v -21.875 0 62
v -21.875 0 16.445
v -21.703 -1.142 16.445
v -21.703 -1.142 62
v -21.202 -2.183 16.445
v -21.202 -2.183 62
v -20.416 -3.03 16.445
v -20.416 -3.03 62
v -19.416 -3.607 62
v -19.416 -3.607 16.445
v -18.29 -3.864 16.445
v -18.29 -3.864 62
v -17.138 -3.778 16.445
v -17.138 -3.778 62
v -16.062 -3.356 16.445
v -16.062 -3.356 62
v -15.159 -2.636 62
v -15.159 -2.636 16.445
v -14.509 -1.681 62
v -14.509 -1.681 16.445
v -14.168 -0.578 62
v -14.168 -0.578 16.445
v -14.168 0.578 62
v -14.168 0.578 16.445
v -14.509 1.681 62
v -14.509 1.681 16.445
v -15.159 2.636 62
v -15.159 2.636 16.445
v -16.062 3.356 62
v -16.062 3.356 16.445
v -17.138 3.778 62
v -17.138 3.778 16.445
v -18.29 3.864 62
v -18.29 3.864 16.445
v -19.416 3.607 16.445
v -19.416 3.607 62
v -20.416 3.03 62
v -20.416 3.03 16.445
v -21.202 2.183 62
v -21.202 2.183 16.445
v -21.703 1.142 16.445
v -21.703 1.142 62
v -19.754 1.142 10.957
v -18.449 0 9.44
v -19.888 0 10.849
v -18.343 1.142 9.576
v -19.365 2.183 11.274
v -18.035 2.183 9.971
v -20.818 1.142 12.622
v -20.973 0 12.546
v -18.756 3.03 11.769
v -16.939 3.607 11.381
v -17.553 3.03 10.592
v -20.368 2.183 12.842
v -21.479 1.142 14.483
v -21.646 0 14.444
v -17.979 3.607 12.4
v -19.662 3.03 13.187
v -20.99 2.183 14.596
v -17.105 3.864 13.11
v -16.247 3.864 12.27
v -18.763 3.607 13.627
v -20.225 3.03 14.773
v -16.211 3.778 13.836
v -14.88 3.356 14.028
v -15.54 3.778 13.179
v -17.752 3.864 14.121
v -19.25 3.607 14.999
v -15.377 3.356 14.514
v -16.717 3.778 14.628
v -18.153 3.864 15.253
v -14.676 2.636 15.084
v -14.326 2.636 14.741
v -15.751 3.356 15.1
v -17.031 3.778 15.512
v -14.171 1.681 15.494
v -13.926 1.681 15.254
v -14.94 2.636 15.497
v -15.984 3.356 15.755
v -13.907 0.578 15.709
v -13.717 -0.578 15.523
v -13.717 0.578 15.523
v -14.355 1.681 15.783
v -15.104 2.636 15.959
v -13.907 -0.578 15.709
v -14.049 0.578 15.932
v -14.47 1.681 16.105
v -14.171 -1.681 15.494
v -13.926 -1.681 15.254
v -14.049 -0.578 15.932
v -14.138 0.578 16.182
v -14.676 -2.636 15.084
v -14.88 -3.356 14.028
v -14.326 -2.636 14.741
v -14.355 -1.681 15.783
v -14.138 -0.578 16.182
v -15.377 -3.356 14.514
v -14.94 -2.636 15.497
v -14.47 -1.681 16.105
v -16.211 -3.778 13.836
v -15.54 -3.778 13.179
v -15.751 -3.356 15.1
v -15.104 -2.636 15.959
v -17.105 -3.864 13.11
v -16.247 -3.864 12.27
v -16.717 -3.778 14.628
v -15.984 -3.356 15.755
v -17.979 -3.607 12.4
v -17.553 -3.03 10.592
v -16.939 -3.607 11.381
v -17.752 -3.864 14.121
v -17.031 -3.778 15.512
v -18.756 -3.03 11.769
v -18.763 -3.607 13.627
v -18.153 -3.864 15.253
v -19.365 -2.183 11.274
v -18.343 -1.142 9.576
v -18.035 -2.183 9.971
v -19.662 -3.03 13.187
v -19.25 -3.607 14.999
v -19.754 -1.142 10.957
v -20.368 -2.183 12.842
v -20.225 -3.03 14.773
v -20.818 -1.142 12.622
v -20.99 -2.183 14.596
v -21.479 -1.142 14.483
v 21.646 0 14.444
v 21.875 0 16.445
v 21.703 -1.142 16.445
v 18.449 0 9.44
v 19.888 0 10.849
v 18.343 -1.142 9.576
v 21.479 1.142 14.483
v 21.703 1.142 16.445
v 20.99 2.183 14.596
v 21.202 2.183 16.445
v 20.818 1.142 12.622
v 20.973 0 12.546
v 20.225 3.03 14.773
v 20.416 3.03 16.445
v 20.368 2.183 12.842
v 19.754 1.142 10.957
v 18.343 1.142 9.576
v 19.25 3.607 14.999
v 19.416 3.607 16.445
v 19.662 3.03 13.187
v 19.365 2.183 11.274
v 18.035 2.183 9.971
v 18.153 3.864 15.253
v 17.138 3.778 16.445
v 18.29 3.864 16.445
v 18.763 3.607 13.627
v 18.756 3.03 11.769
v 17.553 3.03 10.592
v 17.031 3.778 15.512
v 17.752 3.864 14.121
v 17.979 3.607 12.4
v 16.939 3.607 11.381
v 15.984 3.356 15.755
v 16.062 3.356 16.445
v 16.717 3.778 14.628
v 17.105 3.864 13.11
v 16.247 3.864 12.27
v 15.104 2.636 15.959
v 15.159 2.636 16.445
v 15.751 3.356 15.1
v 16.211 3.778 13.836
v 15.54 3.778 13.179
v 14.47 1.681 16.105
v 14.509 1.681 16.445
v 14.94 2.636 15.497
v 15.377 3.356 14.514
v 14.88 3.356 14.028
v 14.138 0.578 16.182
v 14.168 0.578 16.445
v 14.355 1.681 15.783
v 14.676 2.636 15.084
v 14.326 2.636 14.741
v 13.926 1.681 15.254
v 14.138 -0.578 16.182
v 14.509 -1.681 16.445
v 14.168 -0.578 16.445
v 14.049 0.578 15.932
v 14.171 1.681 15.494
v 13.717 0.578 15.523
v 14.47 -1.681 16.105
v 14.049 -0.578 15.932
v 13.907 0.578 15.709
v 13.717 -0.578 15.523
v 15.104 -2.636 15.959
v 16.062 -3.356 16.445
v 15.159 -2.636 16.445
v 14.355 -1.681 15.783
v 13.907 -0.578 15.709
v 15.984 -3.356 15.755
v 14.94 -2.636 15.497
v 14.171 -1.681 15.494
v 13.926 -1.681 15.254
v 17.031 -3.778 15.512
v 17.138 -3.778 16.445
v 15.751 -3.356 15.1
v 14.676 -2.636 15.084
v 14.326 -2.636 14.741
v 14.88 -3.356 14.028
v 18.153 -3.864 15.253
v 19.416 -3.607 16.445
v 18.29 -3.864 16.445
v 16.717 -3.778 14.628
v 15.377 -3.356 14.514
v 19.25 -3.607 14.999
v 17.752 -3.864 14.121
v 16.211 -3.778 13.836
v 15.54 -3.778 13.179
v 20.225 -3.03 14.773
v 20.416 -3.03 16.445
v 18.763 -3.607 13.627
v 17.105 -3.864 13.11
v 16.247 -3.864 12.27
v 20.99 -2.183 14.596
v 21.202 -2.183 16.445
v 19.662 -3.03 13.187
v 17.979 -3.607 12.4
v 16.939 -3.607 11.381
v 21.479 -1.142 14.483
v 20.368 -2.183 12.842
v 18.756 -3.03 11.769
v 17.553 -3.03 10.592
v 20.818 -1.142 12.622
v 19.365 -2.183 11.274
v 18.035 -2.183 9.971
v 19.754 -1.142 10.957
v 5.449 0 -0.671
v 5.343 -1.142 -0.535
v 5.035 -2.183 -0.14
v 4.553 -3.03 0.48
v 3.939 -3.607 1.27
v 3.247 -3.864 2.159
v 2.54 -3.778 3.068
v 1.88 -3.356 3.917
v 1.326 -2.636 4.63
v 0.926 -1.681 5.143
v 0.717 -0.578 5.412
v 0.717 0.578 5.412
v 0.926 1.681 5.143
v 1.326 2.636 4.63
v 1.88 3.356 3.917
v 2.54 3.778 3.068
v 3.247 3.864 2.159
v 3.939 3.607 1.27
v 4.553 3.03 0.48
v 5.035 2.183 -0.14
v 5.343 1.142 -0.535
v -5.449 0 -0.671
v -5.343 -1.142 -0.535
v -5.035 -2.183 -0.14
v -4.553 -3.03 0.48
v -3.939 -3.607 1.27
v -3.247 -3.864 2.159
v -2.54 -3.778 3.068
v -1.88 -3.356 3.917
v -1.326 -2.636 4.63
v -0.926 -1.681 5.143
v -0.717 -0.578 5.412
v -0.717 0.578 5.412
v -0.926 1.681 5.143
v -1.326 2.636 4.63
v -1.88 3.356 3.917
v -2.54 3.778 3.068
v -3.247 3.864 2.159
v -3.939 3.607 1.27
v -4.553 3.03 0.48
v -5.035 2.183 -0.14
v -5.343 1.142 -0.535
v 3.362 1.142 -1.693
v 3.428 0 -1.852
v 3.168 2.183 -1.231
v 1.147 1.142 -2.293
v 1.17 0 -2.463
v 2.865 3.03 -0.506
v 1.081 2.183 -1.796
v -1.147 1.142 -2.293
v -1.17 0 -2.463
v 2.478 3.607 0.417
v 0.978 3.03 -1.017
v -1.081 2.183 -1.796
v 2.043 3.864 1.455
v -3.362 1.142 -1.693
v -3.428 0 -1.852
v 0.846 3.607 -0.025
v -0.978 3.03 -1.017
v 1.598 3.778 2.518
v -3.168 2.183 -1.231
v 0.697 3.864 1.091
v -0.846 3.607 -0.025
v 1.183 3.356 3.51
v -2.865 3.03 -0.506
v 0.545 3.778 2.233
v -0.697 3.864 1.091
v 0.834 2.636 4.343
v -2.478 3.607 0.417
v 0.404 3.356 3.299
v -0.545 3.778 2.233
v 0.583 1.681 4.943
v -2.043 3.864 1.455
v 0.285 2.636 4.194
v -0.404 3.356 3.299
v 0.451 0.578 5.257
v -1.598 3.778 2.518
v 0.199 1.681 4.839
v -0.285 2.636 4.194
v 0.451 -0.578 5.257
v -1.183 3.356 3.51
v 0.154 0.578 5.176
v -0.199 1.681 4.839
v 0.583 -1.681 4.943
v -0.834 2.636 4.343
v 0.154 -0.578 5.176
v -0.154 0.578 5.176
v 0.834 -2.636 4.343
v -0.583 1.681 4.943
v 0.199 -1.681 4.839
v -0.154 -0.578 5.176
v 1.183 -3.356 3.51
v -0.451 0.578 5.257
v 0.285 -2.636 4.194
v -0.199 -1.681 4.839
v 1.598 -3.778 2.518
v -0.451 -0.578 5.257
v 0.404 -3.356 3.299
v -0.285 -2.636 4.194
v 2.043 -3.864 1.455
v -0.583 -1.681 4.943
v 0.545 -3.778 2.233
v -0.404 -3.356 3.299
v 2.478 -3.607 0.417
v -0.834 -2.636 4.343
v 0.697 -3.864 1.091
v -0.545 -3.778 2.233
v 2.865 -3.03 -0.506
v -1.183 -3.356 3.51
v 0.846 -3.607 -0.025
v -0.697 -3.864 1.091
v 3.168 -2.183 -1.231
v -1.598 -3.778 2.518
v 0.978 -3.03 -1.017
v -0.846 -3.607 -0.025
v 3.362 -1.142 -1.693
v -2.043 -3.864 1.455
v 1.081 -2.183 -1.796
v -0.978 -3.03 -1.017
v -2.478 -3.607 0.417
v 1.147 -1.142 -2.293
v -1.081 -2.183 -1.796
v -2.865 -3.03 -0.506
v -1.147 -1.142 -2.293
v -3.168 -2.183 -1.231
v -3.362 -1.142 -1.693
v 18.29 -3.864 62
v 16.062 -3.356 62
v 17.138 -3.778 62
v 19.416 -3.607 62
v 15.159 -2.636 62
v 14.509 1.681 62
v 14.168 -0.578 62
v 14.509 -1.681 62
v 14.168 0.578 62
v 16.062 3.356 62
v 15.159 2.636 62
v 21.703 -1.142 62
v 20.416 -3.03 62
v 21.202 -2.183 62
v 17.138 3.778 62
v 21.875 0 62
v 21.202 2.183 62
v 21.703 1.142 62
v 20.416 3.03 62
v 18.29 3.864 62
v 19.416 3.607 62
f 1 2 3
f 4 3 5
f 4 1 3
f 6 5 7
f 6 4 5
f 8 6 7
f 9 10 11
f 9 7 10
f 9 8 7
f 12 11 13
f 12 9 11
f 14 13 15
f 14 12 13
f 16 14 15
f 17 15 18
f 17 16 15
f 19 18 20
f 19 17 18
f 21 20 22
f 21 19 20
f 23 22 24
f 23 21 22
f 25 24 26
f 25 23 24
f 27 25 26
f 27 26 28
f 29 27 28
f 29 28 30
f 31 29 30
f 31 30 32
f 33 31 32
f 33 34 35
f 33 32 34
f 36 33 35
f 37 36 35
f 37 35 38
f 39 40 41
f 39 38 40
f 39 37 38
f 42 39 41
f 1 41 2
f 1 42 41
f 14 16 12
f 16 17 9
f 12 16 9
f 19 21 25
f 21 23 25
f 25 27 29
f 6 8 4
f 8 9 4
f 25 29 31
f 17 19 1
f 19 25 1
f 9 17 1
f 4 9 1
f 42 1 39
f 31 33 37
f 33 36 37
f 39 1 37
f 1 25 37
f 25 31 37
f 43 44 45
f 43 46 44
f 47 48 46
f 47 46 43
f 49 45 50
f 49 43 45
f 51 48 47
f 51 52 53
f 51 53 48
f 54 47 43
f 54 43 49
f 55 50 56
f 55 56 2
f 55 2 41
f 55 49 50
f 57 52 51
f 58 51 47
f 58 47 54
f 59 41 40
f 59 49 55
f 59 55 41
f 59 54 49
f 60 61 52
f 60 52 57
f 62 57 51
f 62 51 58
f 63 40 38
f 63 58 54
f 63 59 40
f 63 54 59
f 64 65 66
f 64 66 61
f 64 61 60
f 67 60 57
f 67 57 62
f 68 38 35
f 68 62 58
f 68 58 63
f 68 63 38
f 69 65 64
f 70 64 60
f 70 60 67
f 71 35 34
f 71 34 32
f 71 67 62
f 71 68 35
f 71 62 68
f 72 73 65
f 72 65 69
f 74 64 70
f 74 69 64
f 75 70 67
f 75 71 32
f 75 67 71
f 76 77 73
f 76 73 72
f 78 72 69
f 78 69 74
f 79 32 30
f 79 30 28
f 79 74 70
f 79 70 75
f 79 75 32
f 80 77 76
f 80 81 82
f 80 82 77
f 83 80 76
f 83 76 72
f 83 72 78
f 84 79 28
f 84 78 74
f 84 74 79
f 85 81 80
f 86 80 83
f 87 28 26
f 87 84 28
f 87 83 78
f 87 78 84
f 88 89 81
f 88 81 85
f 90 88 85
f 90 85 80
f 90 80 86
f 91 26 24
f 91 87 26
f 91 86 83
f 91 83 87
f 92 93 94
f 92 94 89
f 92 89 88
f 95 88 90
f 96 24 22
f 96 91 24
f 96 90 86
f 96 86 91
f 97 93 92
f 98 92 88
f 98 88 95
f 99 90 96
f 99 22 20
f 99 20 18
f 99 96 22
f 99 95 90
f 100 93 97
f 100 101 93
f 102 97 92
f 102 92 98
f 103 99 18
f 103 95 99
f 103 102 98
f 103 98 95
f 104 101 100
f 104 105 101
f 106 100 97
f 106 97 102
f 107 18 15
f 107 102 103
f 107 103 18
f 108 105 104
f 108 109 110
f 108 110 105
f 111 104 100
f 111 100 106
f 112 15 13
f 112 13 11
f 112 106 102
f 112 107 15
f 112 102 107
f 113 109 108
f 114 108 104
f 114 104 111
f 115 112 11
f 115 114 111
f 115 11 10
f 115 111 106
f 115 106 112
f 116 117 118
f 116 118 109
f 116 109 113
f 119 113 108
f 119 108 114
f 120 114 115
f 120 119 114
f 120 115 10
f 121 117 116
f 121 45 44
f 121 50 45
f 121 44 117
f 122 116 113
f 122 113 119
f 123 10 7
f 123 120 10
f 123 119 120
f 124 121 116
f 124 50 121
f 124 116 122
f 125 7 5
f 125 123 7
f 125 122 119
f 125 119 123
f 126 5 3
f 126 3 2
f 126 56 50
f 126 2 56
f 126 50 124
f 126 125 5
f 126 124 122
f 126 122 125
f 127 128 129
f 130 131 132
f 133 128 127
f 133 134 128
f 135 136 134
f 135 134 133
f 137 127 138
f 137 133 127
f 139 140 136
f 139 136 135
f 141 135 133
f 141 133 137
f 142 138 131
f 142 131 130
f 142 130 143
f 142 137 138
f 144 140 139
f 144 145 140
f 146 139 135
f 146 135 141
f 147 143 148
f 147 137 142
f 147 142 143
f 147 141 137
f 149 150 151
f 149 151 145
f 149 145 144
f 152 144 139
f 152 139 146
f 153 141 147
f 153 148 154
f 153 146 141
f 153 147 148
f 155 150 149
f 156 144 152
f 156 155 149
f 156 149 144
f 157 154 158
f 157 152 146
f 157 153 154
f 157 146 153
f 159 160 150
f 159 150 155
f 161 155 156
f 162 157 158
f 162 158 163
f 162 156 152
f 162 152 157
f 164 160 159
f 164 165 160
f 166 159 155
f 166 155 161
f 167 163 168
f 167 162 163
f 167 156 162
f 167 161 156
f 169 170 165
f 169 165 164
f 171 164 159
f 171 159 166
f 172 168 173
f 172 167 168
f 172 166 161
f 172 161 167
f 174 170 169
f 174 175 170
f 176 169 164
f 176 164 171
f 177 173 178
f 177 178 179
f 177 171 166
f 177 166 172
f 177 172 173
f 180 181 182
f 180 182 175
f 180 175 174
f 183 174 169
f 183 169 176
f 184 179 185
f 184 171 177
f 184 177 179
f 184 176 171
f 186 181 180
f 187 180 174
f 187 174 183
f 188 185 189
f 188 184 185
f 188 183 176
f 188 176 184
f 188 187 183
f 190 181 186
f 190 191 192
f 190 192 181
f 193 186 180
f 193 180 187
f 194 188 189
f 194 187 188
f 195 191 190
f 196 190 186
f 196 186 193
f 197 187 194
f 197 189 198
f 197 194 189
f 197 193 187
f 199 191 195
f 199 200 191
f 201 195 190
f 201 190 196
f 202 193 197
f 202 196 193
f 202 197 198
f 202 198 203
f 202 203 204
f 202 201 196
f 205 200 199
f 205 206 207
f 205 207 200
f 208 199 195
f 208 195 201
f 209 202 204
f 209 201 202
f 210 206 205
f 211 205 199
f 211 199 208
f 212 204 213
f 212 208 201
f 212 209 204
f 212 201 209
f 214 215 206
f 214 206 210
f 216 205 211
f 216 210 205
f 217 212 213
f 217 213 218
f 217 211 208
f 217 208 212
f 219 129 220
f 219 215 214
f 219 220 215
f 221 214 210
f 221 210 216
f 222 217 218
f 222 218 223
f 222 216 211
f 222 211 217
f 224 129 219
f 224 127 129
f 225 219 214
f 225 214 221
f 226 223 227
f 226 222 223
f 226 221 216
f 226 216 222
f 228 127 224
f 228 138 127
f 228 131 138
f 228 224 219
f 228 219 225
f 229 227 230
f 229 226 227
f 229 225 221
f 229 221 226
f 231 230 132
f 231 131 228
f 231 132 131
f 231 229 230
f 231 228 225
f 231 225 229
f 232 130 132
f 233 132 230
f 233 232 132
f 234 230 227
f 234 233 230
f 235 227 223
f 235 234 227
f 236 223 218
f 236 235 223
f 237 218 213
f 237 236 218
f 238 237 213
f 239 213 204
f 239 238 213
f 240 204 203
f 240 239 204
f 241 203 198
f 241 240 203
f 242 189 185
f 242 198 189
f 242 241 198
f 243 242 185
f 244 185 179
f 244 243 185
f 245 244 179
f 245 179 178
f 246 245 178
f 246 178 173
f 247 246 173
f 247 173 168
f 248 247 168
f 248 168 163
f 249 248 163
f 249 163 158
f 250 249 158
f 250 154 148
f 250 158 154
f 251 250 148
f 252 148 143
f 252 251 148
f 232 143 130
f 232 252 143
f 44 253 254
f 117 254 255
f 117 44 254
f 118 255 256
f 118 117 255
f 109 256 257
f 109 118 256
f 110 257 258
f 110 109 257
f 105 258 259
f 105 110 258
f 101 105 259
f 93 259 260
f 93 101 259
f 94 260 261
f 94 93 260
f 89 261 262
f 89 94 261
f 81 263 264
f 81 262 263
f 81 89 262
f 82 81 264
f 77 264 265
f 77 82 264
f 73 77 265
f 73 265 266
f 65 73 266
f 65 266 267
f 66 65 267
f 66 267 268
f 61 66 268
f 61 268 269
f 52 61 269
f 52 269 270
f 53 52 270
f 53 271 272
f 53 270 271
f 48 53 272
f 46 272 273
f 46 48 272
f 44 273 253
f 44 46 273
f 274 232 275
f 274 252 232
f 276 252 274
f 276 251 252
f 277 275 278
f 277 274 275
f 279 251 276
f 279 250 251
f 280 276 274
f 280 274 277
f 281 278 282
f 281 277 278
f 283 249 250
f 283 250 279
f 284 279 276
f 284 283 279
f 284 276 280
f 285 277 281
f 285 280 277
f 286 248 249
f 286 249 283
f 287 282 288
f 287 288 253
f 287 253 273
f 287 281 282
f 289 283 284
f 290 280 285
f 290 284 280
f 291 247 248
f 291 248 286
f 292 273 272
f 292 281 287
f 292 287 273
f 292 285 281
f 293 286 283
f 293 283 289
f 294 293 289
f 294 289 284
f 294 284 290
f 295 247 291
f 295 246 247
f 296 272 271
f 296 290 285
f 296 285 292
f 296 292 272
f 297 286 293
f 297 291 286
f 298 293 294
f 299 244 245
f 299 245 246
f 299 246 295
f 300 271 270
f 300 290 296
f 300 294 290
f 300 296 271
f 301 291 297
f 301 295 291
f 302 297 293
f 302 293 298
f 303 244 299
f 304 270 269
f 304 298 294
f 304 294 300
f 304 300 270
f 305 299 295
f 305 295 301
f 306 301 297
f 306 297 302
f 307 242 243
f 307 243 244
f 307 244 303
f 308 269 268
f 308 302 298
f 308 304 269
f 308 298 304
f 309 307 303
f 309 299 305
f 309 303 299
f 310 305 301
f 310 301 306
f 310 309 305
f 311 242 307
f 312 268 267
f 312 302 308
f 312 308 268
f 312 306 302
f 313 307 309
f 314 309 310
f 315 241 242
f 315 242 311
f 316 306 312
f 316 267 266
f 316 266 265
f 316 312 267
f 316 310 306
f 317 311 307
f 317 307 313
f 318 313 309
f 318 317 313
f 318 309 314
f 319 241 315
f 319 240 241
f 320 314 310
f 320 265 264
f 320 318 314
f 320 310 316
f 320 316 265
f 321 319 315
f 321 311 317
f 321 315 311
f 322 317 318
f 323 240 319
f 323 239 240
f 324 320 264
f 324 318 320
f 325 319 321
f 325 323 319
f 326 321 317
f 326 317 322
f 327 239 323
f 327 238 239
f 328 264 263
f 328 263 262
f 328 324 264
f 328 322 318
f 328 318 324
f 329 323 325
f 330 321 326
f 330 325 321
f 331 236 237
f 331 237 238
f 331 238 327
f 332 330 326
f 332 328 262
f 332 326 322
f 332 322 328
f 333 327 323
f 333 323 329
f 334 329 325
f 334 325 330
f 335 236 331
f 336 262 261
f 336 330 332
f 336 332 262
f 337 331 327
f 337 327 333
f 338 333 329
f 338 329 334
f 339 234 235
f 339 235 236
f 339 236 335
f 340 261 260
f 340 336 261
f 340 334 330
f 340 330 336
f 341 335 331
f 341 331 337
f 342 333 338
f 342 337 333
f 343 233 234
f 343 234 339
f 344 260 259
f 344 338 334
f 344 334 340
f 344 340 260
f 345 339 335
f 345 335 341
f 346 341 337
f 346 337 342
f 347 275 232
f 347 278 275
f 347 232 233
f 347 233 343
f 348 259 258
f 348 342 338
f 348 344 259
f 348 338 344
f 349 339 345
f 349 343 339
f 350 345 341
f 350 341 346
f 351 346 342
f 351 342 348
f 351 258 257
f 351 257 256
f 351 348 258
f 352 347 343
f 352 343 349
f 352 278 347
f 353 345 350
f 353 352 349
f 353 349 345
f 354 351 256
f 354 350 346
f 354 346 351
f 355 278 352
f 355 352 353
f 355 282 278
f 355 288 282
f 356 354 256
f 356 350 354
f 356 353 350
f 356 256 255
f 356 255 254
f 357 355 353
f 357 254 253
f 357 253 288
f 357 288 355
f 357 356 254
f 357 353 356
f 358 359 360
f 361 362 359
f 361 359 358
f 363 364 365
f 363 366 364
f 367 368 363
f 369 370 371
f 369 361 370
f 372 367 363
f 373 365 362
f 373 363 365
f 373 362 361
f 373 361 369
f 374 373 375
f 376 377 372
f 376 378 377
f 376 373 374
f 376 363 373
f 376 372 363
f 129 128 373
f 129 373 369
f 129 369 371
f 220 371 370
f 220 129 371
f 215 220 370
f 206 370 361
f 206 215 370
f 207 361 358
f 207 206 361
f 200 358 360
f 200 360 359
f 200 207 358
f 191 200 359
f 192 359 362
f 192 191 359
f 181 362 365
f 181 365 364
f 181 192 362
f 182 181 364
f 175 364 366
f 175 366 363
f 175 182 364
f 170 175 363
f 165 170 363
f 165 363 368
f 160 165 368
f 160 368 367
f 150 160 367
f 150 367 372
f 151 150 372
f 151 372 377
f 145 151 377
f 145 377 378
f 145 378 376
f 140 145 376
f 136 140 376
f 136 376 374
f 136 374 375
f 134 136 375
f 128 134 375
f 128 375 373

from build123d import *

# Parameters (mm, degrees)
F2_R = 3.875


with BuildPart() as f3:
    # F3: sweep along a path in F0
    with BuildLine(Plane.XZ) as f3_path:
        Line((18, 62), (18, 16.4454190283))
        ThreePointArc((18, 16.4454190283), (17.4915763011, 14.2486617975), (16.0697030676, 12.4986579414))
        Line((16.0697030676, 12.4986579414), (3.0697030676, 2.3875468303))
        ThreePointArc((3.0697030676, 2.3875468303), (0, 1.3343079172), (-3.0697030676, 2.3875468303))
        Line((-3.0697030676, 2.3875468303), (-16.0697030676, 12.4986579414))
        ThreePointArc((-16.0697030676, 12.4986579414), (-17.4915763011, 14.2486617975), (-18, 16.4454190283))
        Line((-18, 16.4454190283), (-18, 62))
    # F2 (on offset) → F3 (sweep)
    with BuildSketch(Plane.XY.offset(62)):
        with Locations((18, 0)):
            Circle(F2_R)
    sweep(path=f3_path.line)


solid = f3.part
